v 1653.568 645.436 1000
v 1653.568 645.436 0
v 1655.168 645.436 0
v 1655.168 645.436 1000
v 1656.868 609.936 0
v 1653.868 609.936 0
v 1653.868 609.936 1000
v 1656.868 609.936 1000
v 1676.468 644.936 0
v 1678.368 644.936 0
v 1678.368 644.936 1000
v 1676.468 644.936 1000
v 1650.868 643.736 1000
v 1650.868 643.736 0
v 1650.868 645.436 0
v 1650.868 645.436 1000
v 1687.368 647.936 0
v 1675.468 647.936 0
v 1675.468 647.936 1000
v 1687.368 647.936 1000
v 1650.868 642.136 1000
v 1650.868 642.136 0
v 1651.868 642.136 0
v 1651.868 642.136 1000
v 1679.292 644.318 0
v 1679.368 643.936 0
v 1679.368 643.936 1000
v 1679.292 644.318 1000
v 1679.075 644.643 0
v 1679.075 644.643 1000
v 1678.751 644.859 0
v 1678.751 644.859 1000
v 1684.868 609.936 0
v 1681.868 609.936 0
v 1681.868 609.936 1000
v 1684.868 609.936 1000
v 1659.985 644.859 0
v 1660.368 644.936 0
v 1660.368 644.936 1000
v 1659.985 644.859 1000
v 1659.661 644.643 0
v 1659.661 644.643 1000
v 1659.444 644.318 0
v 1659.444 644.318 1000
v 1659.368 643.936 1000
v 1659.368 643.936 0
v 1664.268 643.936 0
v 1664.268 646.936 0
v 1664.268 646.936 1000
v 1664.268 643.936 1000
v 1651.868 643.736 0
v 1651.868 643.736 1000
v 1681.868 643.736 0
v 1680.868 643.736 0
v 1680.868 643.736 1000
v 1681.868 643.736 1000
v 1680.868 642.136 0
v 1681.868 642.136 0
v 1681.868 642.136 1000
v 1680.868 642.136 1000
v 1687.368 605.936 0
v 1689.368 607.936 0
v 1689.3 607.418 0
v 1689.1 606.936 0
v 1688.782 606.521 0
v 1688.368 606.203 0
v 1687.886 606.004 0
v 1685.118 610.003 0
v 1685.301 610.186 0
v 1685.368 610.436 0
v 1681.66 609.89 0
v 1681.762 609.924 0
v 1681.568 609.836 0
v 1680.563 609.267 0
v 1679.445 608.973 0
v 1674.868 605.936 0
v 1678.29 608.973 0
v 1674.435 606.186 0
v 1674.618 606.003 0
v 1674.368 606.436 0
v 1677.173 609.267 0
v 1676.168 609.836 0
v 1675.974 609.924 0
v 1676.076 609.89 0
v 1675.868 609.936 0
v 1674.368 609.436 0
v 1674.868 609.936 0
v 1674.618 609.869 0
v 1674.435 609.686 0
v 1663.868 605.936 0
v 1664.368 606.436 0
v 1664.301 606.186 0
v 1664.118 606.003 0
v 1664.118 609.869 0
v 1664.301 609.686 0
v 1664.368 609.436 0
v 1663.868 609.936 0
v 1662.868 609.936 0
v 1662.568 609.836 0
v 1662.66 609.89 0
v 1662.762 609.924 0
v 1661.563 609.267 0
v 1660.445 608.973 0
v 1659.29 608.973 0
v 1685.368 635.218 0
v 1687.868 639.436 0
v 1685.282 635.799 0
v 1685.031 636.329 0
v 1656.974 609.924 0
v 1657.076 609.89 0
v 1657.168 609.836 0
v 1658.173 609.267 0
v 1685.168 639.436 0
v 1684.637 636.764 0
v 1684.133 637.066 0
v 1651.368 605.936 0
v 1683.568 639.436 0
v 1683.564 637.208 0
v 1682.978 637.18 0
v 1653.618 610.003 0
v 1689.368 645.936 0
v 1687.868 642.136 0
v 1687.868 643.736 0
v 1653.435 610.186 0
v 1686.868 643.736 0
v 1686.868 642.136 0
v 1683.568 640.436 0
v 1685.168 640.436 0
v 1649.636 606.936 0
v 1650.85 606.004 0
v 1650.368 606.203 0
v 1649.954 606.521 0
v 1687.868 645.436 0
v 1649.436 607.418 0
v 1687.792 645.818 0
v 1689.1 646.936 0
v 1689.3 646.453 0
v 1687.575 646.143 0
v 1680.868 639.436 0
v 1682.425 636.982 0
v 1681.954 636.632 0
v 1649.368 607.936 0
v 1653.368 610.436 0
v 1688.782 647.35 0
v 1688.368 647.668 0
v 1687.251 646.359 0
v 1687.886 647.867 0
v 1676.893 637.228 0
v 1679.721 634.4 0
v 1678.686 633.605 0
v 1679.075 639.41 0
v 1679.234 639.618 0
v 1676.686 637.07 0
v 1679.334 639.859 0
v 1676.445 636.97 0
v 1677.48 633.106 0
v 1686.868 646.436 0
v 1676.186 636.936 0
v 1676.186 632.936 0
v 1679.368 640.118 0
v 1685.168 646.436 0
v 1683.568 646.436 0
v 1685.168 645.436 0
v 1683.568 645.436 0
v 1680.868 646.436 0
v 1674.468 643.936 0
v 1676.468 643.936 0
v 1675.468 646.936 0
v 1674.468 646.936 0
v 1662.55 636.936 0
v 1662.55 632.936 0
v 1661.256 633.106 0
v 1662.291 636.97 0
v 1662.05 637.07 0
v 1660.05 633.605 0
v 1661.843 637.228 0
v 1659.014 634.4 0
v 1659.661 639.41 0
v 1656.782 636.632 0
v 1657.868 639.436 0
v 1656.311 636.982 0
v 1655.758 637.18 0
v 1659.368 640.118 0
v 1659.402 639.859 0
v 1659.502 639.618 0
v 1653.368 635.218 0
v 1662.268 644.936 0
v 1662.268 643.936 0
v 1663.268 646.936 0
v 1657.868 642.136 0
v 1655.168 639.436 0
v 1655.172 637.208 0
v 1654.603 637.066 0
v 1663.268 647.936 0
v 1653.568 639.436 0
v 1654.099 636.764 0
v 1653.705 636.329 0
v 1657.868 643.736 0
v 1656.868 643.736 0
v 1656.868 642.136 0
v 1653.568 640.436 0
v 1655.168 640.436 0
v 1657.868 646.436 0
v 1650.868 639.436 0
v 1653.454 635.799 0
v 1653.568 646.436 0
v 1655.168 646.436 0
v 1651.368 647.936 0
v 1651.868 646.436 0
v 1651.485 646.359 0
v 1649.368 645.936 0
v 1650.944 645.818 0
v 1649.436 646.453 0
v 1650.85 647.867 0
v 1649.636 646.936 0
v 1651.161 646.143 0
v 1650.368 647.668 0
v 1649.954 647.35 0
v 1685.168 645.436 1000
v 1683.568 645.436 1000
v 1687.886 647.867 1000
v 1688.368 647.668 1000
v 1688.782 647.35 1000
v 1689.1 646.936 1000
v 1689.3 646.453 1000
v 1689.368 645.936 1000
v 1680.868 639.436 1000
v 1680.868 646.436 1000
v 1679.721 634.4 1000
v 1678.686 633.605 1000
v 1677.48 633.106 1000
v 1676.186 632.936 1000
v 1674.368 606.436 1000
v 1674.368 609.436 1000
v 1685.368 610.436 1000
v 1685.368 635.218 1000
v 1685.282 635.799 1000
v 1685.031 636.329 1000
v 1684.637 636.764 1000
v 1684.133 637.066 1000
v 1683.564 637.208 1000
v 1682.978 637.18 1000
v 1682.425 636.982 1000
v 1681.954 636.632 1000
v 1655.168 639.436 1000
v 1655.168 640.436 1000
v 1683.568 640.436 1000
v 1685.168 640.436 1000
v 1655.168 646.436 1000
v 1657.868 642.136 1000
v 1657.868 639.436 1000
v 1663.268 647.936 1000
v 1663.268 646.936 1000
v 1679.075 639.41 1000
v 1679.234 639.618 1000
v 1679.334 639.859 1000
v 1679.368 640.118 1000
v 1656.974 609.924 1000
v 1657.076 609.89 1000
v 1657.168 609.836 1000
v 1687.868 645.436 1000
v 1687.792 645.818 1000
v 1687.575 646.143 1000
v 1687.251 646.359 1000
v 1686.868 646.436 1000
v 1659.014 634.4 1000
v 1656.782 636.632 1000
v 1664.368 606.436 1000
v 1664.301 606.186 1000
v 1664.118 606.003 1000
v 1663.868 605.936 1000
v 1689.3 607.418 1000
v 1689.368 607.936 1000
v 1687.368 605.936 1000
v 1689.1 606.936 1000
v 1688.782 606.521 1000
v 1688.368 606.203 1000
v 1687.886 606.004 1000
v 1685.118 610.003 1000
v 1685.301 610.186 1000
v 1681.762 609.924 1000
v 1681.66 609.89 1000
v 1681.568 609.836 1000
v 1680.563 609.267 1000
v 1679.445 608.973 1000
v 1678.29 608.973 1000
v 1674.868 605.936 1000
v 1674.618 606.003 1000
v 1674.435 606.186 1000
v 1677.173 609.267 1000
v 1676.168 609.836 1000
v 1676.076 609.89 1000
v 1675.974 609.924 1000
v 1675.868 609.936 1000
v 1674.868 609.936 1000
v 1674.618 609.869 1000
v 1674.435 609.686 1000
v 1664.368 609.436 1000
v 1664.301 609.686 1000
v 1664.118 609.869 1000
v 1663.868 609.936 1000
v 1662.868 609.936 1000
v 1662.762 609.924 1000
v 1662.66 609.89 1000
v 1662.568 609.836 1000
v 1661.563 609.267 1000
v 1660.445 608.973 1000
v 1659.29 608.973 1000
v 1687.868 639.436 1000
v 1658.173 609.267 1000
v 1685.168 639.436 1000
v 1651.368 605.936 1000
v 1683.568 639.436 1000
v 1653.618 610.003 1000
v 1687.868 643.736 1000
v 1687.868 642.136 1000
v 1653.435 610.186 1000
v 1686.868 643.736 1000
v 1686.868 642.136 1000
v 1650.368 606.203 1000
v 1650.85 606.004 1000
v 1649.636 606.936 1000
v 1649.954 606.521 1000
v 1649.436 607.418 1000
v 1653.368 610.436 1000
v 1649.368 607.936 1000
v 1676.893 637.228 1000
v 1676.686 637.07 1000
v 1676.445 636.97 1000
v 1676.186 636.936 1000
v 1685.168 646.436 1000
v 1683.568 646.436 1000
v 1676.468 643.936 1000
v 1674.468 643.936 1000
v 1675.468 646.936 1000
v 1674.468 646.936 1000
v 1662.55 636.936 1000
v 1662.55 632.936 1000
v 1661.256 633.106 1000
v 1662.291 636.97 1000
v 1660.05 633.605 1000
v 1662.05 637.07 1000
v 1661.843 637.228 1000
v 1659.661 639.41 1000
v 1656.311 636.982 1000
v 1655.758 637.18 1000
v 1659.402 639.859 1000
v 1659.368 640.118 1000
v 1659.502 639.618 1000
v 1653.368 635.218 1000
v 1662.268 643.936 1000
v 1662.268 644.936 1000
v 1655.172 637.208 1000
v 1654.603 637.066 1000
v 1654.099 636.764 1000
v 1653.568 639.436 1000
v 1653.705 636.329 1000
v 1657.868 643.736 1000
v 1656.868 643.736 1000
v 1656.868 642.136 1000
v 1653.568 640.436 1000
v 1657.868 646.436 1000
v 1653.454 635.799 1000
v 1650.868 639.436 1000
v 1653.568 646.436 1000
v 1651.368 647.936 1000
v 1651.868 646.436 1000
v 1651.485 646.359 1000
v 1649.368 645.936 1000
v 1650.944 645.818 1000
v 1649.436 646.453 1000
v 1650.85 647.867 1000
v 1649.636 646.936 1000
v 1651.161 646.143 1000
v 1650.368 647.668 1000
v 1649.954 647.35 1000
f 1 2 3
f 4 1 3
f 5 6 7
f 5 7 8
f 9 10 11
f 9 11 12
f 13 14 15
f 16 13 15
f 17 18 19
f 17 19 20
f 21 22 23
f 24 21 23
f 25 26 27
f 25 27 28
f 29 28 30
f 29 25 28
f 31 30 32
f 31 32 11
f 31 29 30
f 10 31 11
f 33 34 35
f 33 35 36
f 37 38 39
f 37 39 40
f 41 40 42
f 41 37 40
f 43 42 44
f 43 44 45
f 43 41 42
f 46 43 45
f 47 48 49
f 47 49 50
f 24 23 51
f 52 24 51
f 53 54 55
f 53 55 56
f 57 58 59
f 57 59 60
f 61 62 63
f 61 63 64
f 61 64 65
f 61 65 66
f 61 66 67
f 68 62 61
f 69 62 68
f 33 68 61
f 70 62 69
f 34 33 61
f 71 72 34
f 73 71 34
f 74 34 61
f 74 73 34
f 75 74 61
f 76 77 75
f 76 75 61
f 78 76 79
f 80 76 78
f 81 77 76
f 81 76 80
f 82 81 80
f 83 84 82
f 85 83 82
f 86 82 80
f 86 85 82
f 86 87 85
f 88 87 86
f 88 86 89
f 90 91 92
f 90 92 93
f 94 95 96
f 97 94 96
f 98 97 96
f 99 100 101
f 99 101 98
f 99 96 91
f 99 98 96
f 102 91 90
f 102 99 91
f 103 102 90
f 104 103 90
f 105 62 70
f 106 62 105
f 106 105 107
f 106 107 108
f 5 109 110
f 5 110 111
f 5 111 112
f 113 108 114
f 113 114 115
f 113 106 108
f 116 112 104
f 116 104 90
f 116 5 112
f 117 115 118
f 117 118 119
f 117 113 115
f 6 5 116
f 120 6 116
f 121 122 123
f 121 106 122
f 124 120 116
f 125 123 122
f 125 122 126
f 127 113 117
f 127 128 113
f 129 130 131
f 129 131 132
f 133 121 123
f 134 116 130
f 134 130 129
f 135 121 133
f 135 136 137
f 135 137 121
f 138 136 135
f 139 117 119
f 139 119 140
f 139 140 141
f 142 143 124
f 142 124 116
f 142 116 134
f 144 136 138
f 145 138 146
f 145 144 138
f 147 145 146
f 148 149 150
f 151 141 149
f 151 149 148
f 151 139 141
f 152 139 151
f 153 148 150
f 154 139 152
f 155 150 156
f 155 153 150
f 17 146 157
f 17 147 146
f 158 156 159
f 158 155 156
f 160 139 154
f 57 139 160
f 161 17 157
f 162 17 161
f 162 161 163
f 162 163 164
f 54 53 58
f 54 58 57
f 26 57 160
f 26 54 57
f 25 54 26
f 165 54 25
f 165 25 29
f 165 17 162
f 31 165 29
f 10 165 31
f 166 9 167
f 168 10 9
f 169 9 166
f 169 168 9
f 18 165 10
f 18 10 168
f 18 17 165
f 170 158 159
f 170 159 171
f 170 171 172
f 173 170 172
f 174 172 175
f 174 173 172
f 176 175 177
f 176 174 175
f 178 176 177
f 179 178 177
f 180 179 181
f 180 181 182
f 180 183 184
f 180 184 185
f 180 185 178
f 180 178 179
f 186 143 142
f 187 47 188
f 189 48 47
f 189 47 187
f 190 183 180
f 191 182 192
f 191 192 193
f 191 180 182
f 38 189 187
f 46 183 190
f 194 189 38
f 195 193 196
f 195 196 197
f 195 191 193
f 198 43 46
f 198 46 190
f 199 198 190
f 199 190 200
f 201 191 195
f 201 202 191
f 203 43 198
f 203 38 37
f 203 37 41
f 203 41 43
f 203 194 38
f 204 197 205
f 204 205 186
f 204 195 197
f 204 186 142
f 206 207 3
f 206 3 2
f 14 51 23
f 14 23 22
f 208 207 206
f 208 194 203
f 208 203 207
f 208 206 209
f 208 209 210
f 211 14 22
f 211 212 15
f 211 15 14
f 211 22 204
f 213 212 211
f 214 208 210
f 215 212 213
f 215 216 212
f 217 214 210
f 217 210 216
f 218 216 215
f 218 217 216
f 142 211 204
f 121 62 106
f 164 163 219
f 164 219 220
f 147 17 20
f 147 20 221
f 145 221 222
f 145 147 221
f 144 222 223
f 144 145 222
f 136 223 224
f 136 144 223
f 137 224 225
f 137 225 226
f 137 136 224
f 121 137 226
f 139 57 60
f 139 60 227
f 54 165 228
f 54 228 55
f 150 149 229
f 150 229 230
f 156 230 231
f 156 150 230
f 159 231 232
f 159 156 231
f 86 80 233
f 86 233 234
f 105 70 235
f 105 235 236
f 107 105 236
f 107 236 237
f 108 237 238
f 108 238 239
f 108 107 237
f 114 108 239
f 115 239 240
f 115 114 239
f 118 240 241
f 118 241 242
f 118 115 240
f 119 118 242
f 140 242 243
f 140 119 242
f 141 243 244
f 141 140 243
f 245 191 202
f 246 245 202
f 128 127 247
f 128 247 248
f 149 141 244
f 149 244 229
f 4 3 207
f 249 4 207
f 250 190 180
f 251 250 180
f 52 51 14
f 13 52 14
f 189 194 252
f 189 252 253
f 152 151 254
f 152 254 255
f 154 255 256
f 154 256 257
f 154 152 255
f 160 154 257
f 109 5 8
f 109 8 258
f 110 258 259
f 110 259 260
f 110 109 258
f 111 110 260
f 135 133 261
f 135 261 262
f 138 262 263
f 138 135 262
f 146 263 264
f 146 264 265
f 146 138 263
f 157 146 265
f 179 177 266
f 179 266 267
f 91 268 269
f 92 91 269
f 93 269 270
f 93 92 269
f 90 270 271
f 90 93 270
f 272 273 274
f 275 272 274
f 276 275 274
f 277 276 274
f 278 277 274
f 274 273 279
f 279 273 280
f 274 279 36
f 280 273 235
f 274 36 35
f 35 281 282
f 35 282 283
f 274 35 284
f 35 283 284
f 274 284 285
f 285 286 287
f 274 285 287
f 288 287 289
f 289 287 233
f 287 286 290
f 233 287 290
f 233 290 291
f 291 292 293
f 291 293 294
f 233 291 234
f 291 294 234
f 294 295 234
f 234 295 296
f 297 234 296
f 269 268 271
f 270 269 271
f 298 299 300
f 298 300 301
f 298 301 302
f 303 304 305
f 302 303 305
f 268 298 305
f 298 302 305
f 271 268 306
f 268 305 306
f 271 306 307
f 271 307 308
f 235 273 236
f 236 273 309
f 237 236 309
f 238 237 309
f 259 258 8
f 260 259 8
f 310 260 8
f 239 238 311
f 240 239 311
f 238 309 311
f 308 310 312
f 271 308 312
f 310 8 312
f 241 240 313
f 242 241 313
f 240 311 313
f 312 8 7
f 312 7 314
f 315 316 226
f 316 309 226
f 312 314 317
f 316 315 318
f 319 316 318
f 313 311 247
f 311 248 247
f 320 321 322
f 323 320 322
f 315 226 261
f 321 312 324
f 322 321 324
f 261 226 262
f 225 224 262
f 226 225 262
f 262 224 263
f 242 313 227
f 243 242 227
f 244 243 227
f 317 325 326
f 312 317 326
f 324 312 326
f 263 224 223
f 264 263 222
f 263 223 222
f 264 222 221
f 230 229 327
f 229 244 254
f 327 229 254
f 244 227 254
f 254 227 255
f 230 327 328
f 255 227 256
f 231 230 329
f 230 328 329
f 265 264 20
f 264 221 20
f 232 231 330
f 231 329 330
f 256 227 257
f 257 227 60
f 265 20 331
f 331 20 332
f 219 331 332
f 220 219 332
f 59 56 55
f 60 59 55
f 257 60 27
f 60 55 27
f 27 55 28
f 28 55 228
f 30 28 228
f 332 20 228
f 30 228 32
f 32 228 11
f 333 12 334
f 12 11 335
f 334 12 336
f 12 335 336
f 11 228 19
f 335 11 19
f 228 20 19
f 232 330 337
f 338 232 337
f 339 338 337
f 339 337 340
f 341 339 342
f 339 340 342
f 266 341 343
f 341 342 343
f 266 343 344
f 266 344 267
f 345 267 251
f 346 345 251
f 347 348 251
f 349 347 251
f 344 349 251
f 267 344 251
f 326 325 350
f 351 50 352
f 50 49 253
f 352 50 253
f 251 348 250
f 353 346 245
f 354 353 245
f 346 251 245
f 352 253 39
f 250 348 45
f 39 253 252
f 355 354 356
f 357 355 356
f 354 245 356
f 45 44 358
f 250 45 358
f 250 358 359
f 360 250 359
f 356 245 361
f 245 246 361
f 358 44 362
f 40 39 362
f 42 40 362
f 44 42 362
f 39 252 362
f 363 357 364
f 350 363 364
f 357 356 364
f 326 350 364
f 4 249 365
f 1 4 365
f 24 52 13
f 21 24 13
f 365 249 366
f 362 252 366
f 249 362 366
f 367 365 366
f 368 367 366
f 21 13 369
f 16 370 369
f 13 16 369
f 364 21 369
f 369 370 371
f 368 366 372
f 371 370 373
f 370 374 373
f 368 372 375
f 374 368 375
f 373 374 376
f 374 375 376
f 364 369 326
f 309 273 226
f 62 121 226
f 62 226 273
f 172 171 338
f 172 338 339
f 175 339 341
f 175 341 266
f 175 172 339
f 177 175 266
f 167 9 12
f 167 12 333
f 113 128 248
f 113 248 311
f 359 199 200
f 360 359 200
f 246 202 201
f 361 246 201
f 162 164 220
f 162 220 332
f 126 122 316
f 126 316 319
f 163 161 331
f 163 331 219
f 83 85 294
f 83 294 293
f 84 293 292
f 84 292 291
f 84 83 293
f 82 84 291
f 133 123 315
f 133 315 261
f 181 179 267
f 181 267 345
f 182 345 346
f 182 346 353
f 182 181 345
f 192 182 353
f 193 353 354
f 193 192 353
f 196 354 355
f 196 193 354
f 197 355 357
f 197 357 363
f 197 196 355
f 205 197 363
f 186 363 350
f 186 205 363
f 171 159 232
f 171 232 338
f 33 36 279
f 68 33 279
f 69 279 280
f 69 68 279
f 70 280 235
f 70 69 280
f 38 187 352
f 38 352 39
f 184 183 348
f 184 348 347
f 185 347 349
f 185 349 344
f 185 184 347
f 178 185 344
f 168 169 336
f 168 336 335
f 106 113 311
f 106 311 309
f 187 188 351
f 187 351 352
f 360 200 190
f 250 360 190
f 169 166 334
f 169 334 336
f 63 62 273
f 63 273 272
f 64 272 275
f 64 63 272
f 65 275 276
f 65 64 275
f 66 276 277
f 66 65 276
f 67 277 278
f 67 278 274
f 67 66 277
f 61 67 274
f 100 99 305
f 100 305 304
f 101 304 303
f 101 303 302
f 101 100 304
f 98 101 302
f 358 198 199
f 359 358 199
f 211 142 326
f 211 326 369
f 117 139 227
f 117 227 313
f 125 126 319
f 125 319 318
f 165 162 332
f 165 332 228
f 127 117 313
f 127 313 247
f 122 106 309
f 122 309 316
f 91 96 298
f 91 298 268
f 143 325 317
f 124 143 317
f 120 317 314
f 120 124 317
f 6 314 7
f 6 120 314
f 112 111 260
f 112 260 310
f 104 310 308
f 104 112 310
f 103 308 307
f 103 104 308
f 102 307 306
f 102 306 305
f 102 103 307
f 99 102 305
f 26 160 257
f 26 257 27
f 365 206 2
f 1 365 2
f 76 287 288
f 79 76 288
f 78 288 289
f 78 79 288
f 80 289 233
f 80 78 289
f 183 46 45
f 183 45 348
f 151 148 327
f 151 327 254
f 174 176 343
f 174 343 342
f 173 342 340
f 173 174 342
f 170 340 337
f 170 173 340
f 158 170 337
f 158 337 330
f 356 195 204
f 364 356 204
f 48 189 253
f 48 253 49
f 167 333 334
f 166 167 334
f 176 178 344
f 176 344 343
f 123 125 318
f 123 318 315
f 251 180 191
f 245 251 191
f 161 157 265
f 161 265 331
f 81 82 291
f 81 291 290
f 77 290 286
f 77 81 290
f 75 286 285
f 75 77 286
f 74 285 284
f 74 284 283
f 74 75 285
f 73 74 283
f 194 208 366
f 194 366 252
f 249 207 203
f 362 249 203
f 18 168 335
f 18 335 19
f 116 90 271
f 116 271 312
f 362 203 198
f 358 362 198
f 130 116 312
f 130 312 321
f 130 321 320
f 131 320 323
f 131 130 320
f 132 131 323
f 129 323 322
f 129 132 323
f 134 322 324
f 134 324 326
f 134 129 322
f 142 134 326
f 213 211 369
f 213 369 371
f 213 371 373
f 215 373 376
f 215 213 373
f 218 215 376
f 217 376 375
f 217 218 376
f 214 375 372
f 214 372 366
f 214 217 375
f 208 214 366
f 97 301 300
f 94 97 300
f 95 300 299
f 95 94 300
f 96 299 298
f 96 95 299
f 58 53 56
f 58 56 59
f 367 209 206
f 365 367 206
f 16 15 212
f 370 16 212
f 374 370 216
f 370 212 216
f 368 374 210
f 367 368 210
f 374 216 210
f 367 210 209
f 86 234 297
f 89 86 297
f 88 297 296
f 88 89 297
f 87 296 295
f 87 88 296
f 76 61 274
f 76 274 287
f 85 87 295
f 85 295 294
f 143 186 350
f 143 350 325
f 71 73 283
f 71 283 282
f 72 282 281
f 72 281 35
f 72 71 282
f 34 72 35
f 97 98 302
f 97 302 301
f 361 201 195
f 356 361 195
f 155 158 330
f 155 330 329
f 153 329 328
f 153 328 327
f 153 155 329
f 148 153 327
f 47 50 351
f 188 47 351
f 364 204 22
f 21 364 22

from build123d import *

# Parameters (mm, degrees)
EXTRUDE_1_DEPTH = 1000


with BuildPart() as part:
    # Model → 凸台-拉伸1 (new body)
    with BuildSketch(Plane.XY):
        with BuildLine():
            Line((1653.86794414, 609.935540563), (1656.86794414, 609.935540563))
            ThreePointArc((1656.86794414, 609.935540563), (1657.026058023, 609.909882212), (1657.16794414, 609.835540563))
            ThreePointArc((1657.16794414, 609.835540563), (1659.86794414, 608.935540563), (1662.56794414, 609.835540563))
            ThreePointArc((1662.56794414, 609.835540563), (1662.709830257, 609.909882212), (1662.86794414, 609.935540563))
            Line((1662.86794414, 609.935540563), (1663.86794414, 609.935540563))
            ThreePointArc((1663.86794414, 609.935540563), (1664.221497531, 609.789093954), (1664.36794414, 609.435540563))
            Line((1664.36794414, 609.435540563), (1664.36794414, 606.435540563))
            ThreePointArc((1664.36794414, 606.435540563), (1664.221497531, 606.081987172), (1663.86794414, 605.935540563))
            Line((1663.86794414, 605.935540563), (1651.36794414, 605.935540563))
            ThreePointArc((1651.36794414, 605.935540563), (1649.953730578, 606.521327001), (1649.36794414, 607.935540563))
            Line((1649.36794414, 607.935540563), (1649.36794414, 645.935540563))
            ThreePointArc((1649.36794414, 645.935540563), (1649.953730578, 647.349754125), (1651.36794414, 647.935540563))
            Line((1651.36794414, 647.935540563), (1663.26794414, 647.935540563))
            Line((1663.26794414, 647.935540563), (1663.26794414, 646.935540563))
            Line((1663.26794414, 646.935540563), (1664.26794414, 646.935540563))
            Line((1664.26794414, 646.935540563), (1664.26794414, 643.935540563))
            Line((1664.26794414, 643.935540563), (1662.26794414, 643.935540563))
            Line((1662.26794414, 643.935540563), (1662.26794414, 644.935540563))
            Line((1662.26794414, 644.935540563), (1660.36794414, 644.935540563))
            ThreePointArc((1660.36794414, 644.935540563), (1659.660837359, 644.642647344), (1659.36794414, 643.935540563))
            Line((1659.36794414, 643.935540563), (1659.36794414, 640.117521078))
            ThreePointArc((1659.36794414, 640.117521078), (1659.444064608, 639.734837646), (1659.660837359, 639.410414297))
            Line((1659.660837359, 639.410414297), (1661.842817874, 637.228433782))
            ThreePointArc((1661.842817874, 637.228433782), (1662.167241223, 637.011661031), (1662.549924656, 636.935540563))
            Line((1662.549924656, 636.935540563), (1676.185963625, 636.935540563))
            ThreePointArc((1676.185963625, 636.935540563), (1676.568647057, 637.011661031), (1676.893070406, 637.228433782))
            Line((1676.893070406, 637.228433782), (1679.075050921, 639.410414297))
            ThreePointArc((1679.075050921, 639.410414297), (1679.291823673, 639.734837646), (1679.36794414, 640.117521078))
            Line((1679.36794414, 640.117521078), (1679.36794414, 643.935540563))
            ThreePointArc((1679.36794414, 643.935540563), (1679.075050921, 644.642647344), (1678.36794414, 644.935540563))
            Line((1678.36794414, 644.935540563), (1676.46794414, 644.935540563))
            Line((1676.46794414, 644.935540563), (1676.46794414, 643.935540563))
            Line((1676.46794414, 643.935540563), (1674.46794414, 643.935540563))
            Line((1674.46794414, 643.935540563), (1674.46794414, 646.935540563))
            Line((1674.46794414, 646.935540563), (1675.46794414, 646.935540563))
            Line((1675.46794414, 646.935540563), (1675.46794414, 647.935540563))
            Line((1675.46794414, 647.935540563), (1687.36794414, 647.935540563))
            ThreePointArc((1687.36794414, 647.935540563), (1688.782157703, 647.349754125), (1689.36794414, 645.935540563))
            Line((1689.36794414, 645.935540563), (1689.36794414, 607.935540563))
            ThreePointArc((1689.36794414, 607.935540563), (1688.782157703, 606.521327001), (1687.36794414, 605.935540563))
            Line((1687.36794414, 605.935540563), (1674.86794414, 605.935540563))
            ThreePointArc((1674.86794414, 605.935540563), (1674.51439075, 606.081987172), (1674.36794414, 606.435540563))
            Line((1674.36794414, 606.435540563), (1674.36794414, 609.435540563))
            ThreePointArc((1674.36794414, 609.435540563), (1674.51439075, 609.789093954), (1674.86794414, 609.935540563))
            Line((1674.86794414, 609.935540563), (1675.86794414, 609.935540563))
            ThreePointArc((1675.86794414, 609.935540563), (1676.026058023, 609.909882212), (1676.16794414, 609.835540563))
            ThreePointArc((1676.16794414, 609.835540563), (1678.86794414, 608.935540563), (1681.56794414, 609.835540563))
            ThreePointArc((1681.56794414, 609.835540563), (1681.709830257, 609.909882212), (1681.86794414, 609.935540563))
            Line((1681.86794414, 609.935540563), (1684.86794414, 609.935540563))
            ThreePointArc((1684.86794414, 609.935540563), (1685.221497531, 610.081987172), (1685.36794414, 610.435540563))
            Line((1685.36794414, 610.435540563), (1685.36794414, 635.218026142))
            ThreePointArc((1685.36794414, 635.218026142), (1684.133311005, 637.065785207), (1681.953730578, 636.632239704))
            Line((1681.953730578, 636.632239704), (1679.721497531, 634.400006657))
            ThreePointArc((1679.721497531, 634.400006657), (1678.099380787, 633.3161429), (1676.185963625, 632.935540563))
            Line((1676.185963625, 632.935540563), (1662.549924656, 632.935540563))
            ThreePointArc((1662.549924656, 632.935540563), (1660.636507494, 633.3161429), (1659.01439075, 634.400006657))
            Line((1659.01439075, 634.400006657), (1656.782157703, 636.632239704))
            ThreePointArc((1656.782157703, 636.632239704), (1654.602577276, 637.065785207), (1653.36794414, 635.218026142))
            Line((1653.36794414, 635.218026142), (1653.36794414, 610.435540563))
            ThreePointArc((1653.36794414, 610.435540563), (1653.51439075, 610.081987172), (1653.86794414, 609.935540563))
        make_face()
        with BuildLine():
            Line((1657.86794414, 639.435540563), (1655.16794414, 639.435540563))
            Line((1655.16794414, 639.435540563), (1655.16794414, 640.435540563))
            Line((1655.16794414, 640.435540563), (1653.56794414, 640.435540563))
            Line((1653.56794414, 640.435540563), (1653.56794414, 639.435540563))
            Line((1653.56794414, 639.435540563), (1650.86794414, 639.435540563))
            Line((1650.86794414, 639.435540563), (1650.86794414, 642.135540563))
            Line((1650.86794414, 642.135540563), (1651.86794414, 642.135540563))
            Line((1651.86794414, 642.135540563), (1651.86794414, 643.735540563))
            Line((1651.86794414, 643.735540563), (1650.86794414, 643.735540563))
            Line((1650.86794414, 643.735540563), (1650.86794414, 645.435540563))
            ThreePointArc((1650.86794414, 645.435540563), (1651.160837359, 646.142647344), (1651.86794414, 646.435540563))
            Line((1651.86794414, 646.435540563), (1653.56794414, 646.435540563))
            Line((1653.56794414, 646.435540563), (1653.56794414, 645.435540563))
            Line((1653.56794414, 645.435540563), (1655.16794414, 645.435540563))
            Line((1655.16794414, 645.435540563), (1655.16794414, 646.435540563))
            Line((1655.16794414, 646.435540563), (1657.86794414, 646.435540563))
            Line((1657.86794414, 646.435540563), (1657.86794414, 643.735540563))
            Line((1657.86794414, 643.735540563), (1656.86794414, 643.735540563))
            Line((1656.86794414, 643.735540563), (1656.86794414, 642.135540563))
            Line((1656.86794414, 642.135540563), (1657.86794414, 642.135540563))
            Line((1657.86794414, 642.135540563), (1657.86794414, 639.435540563))
        make_face(mode=Mode.SUBTRACT)
        with BuildLine():
            Line((1686.86794414, 643.735540563), (1687.86794414, 643.735540563))
            Line((1687.86794414, 643.735540563), (1687.86794414, 645.435540563))
            ThreePointArc((1687.86794414, 645.435540563), (1687.575050921, 646.142647344), (1686.86794414, 646.435540563))
            Line((1686.86794414, 646.435540563), (1685.16794414, 646.435540563))
            Line((1685.16794414, 646.435540563), (1685.16794414, 645.435540563))
            Line((1685.16794414, 645.435540563), (1683.56794414, 645.435540563))
            Line((1683.56794414, 645.435540563), (1683.56794414, 646.435540563))
            Line((1683.56794414, 646.435540563), (1680.86794414, 646.435540563))
            Line((1680.86794414, 646.435540563), (1680.86794414, 643.735540563))
            Line((1680.86794414, 643.735540563), (1681.86794414, 643.735540563))
            Line((1681.86794414, 643.735540563), (1681.86794414, 642.135540563))
            Line((1681.86794414, 642.135540563), (1680.86794414, 642.135540563))
            Line((1680.86794414, 642.135540563), (1680.86794414, 639.435540563))
            Line((1680.86794414, 639.435540563), (1683.56794414, 639.435540563))
            Line((1683.56794414, 639.435540563), (1683.56794414, 640.435540563))
            Line((1683.56794414, 640.435540563), (1685.16794414, 640.435540563))
            Line((1685.16794414, 640.435540563), (1685.16794414, 639.435540563))
            Line((1685.16794414, 639.435540563), (1687.86794414, 639.435540563))
            Line((1687.86794414, 639.435540563), (1687.86794414, 642.135540563))
            Line((1687.86794414, 642.135540563), (1686.86794414, 642.135540563))
            Line((1686.86794414, 642.135540563), (1686.86794414, 643.735540563))
        make_face(mode=Mode.SUBTRACT)
    extrude(amount=EXTRUDE_1_DEPTH)


solid = part.part
